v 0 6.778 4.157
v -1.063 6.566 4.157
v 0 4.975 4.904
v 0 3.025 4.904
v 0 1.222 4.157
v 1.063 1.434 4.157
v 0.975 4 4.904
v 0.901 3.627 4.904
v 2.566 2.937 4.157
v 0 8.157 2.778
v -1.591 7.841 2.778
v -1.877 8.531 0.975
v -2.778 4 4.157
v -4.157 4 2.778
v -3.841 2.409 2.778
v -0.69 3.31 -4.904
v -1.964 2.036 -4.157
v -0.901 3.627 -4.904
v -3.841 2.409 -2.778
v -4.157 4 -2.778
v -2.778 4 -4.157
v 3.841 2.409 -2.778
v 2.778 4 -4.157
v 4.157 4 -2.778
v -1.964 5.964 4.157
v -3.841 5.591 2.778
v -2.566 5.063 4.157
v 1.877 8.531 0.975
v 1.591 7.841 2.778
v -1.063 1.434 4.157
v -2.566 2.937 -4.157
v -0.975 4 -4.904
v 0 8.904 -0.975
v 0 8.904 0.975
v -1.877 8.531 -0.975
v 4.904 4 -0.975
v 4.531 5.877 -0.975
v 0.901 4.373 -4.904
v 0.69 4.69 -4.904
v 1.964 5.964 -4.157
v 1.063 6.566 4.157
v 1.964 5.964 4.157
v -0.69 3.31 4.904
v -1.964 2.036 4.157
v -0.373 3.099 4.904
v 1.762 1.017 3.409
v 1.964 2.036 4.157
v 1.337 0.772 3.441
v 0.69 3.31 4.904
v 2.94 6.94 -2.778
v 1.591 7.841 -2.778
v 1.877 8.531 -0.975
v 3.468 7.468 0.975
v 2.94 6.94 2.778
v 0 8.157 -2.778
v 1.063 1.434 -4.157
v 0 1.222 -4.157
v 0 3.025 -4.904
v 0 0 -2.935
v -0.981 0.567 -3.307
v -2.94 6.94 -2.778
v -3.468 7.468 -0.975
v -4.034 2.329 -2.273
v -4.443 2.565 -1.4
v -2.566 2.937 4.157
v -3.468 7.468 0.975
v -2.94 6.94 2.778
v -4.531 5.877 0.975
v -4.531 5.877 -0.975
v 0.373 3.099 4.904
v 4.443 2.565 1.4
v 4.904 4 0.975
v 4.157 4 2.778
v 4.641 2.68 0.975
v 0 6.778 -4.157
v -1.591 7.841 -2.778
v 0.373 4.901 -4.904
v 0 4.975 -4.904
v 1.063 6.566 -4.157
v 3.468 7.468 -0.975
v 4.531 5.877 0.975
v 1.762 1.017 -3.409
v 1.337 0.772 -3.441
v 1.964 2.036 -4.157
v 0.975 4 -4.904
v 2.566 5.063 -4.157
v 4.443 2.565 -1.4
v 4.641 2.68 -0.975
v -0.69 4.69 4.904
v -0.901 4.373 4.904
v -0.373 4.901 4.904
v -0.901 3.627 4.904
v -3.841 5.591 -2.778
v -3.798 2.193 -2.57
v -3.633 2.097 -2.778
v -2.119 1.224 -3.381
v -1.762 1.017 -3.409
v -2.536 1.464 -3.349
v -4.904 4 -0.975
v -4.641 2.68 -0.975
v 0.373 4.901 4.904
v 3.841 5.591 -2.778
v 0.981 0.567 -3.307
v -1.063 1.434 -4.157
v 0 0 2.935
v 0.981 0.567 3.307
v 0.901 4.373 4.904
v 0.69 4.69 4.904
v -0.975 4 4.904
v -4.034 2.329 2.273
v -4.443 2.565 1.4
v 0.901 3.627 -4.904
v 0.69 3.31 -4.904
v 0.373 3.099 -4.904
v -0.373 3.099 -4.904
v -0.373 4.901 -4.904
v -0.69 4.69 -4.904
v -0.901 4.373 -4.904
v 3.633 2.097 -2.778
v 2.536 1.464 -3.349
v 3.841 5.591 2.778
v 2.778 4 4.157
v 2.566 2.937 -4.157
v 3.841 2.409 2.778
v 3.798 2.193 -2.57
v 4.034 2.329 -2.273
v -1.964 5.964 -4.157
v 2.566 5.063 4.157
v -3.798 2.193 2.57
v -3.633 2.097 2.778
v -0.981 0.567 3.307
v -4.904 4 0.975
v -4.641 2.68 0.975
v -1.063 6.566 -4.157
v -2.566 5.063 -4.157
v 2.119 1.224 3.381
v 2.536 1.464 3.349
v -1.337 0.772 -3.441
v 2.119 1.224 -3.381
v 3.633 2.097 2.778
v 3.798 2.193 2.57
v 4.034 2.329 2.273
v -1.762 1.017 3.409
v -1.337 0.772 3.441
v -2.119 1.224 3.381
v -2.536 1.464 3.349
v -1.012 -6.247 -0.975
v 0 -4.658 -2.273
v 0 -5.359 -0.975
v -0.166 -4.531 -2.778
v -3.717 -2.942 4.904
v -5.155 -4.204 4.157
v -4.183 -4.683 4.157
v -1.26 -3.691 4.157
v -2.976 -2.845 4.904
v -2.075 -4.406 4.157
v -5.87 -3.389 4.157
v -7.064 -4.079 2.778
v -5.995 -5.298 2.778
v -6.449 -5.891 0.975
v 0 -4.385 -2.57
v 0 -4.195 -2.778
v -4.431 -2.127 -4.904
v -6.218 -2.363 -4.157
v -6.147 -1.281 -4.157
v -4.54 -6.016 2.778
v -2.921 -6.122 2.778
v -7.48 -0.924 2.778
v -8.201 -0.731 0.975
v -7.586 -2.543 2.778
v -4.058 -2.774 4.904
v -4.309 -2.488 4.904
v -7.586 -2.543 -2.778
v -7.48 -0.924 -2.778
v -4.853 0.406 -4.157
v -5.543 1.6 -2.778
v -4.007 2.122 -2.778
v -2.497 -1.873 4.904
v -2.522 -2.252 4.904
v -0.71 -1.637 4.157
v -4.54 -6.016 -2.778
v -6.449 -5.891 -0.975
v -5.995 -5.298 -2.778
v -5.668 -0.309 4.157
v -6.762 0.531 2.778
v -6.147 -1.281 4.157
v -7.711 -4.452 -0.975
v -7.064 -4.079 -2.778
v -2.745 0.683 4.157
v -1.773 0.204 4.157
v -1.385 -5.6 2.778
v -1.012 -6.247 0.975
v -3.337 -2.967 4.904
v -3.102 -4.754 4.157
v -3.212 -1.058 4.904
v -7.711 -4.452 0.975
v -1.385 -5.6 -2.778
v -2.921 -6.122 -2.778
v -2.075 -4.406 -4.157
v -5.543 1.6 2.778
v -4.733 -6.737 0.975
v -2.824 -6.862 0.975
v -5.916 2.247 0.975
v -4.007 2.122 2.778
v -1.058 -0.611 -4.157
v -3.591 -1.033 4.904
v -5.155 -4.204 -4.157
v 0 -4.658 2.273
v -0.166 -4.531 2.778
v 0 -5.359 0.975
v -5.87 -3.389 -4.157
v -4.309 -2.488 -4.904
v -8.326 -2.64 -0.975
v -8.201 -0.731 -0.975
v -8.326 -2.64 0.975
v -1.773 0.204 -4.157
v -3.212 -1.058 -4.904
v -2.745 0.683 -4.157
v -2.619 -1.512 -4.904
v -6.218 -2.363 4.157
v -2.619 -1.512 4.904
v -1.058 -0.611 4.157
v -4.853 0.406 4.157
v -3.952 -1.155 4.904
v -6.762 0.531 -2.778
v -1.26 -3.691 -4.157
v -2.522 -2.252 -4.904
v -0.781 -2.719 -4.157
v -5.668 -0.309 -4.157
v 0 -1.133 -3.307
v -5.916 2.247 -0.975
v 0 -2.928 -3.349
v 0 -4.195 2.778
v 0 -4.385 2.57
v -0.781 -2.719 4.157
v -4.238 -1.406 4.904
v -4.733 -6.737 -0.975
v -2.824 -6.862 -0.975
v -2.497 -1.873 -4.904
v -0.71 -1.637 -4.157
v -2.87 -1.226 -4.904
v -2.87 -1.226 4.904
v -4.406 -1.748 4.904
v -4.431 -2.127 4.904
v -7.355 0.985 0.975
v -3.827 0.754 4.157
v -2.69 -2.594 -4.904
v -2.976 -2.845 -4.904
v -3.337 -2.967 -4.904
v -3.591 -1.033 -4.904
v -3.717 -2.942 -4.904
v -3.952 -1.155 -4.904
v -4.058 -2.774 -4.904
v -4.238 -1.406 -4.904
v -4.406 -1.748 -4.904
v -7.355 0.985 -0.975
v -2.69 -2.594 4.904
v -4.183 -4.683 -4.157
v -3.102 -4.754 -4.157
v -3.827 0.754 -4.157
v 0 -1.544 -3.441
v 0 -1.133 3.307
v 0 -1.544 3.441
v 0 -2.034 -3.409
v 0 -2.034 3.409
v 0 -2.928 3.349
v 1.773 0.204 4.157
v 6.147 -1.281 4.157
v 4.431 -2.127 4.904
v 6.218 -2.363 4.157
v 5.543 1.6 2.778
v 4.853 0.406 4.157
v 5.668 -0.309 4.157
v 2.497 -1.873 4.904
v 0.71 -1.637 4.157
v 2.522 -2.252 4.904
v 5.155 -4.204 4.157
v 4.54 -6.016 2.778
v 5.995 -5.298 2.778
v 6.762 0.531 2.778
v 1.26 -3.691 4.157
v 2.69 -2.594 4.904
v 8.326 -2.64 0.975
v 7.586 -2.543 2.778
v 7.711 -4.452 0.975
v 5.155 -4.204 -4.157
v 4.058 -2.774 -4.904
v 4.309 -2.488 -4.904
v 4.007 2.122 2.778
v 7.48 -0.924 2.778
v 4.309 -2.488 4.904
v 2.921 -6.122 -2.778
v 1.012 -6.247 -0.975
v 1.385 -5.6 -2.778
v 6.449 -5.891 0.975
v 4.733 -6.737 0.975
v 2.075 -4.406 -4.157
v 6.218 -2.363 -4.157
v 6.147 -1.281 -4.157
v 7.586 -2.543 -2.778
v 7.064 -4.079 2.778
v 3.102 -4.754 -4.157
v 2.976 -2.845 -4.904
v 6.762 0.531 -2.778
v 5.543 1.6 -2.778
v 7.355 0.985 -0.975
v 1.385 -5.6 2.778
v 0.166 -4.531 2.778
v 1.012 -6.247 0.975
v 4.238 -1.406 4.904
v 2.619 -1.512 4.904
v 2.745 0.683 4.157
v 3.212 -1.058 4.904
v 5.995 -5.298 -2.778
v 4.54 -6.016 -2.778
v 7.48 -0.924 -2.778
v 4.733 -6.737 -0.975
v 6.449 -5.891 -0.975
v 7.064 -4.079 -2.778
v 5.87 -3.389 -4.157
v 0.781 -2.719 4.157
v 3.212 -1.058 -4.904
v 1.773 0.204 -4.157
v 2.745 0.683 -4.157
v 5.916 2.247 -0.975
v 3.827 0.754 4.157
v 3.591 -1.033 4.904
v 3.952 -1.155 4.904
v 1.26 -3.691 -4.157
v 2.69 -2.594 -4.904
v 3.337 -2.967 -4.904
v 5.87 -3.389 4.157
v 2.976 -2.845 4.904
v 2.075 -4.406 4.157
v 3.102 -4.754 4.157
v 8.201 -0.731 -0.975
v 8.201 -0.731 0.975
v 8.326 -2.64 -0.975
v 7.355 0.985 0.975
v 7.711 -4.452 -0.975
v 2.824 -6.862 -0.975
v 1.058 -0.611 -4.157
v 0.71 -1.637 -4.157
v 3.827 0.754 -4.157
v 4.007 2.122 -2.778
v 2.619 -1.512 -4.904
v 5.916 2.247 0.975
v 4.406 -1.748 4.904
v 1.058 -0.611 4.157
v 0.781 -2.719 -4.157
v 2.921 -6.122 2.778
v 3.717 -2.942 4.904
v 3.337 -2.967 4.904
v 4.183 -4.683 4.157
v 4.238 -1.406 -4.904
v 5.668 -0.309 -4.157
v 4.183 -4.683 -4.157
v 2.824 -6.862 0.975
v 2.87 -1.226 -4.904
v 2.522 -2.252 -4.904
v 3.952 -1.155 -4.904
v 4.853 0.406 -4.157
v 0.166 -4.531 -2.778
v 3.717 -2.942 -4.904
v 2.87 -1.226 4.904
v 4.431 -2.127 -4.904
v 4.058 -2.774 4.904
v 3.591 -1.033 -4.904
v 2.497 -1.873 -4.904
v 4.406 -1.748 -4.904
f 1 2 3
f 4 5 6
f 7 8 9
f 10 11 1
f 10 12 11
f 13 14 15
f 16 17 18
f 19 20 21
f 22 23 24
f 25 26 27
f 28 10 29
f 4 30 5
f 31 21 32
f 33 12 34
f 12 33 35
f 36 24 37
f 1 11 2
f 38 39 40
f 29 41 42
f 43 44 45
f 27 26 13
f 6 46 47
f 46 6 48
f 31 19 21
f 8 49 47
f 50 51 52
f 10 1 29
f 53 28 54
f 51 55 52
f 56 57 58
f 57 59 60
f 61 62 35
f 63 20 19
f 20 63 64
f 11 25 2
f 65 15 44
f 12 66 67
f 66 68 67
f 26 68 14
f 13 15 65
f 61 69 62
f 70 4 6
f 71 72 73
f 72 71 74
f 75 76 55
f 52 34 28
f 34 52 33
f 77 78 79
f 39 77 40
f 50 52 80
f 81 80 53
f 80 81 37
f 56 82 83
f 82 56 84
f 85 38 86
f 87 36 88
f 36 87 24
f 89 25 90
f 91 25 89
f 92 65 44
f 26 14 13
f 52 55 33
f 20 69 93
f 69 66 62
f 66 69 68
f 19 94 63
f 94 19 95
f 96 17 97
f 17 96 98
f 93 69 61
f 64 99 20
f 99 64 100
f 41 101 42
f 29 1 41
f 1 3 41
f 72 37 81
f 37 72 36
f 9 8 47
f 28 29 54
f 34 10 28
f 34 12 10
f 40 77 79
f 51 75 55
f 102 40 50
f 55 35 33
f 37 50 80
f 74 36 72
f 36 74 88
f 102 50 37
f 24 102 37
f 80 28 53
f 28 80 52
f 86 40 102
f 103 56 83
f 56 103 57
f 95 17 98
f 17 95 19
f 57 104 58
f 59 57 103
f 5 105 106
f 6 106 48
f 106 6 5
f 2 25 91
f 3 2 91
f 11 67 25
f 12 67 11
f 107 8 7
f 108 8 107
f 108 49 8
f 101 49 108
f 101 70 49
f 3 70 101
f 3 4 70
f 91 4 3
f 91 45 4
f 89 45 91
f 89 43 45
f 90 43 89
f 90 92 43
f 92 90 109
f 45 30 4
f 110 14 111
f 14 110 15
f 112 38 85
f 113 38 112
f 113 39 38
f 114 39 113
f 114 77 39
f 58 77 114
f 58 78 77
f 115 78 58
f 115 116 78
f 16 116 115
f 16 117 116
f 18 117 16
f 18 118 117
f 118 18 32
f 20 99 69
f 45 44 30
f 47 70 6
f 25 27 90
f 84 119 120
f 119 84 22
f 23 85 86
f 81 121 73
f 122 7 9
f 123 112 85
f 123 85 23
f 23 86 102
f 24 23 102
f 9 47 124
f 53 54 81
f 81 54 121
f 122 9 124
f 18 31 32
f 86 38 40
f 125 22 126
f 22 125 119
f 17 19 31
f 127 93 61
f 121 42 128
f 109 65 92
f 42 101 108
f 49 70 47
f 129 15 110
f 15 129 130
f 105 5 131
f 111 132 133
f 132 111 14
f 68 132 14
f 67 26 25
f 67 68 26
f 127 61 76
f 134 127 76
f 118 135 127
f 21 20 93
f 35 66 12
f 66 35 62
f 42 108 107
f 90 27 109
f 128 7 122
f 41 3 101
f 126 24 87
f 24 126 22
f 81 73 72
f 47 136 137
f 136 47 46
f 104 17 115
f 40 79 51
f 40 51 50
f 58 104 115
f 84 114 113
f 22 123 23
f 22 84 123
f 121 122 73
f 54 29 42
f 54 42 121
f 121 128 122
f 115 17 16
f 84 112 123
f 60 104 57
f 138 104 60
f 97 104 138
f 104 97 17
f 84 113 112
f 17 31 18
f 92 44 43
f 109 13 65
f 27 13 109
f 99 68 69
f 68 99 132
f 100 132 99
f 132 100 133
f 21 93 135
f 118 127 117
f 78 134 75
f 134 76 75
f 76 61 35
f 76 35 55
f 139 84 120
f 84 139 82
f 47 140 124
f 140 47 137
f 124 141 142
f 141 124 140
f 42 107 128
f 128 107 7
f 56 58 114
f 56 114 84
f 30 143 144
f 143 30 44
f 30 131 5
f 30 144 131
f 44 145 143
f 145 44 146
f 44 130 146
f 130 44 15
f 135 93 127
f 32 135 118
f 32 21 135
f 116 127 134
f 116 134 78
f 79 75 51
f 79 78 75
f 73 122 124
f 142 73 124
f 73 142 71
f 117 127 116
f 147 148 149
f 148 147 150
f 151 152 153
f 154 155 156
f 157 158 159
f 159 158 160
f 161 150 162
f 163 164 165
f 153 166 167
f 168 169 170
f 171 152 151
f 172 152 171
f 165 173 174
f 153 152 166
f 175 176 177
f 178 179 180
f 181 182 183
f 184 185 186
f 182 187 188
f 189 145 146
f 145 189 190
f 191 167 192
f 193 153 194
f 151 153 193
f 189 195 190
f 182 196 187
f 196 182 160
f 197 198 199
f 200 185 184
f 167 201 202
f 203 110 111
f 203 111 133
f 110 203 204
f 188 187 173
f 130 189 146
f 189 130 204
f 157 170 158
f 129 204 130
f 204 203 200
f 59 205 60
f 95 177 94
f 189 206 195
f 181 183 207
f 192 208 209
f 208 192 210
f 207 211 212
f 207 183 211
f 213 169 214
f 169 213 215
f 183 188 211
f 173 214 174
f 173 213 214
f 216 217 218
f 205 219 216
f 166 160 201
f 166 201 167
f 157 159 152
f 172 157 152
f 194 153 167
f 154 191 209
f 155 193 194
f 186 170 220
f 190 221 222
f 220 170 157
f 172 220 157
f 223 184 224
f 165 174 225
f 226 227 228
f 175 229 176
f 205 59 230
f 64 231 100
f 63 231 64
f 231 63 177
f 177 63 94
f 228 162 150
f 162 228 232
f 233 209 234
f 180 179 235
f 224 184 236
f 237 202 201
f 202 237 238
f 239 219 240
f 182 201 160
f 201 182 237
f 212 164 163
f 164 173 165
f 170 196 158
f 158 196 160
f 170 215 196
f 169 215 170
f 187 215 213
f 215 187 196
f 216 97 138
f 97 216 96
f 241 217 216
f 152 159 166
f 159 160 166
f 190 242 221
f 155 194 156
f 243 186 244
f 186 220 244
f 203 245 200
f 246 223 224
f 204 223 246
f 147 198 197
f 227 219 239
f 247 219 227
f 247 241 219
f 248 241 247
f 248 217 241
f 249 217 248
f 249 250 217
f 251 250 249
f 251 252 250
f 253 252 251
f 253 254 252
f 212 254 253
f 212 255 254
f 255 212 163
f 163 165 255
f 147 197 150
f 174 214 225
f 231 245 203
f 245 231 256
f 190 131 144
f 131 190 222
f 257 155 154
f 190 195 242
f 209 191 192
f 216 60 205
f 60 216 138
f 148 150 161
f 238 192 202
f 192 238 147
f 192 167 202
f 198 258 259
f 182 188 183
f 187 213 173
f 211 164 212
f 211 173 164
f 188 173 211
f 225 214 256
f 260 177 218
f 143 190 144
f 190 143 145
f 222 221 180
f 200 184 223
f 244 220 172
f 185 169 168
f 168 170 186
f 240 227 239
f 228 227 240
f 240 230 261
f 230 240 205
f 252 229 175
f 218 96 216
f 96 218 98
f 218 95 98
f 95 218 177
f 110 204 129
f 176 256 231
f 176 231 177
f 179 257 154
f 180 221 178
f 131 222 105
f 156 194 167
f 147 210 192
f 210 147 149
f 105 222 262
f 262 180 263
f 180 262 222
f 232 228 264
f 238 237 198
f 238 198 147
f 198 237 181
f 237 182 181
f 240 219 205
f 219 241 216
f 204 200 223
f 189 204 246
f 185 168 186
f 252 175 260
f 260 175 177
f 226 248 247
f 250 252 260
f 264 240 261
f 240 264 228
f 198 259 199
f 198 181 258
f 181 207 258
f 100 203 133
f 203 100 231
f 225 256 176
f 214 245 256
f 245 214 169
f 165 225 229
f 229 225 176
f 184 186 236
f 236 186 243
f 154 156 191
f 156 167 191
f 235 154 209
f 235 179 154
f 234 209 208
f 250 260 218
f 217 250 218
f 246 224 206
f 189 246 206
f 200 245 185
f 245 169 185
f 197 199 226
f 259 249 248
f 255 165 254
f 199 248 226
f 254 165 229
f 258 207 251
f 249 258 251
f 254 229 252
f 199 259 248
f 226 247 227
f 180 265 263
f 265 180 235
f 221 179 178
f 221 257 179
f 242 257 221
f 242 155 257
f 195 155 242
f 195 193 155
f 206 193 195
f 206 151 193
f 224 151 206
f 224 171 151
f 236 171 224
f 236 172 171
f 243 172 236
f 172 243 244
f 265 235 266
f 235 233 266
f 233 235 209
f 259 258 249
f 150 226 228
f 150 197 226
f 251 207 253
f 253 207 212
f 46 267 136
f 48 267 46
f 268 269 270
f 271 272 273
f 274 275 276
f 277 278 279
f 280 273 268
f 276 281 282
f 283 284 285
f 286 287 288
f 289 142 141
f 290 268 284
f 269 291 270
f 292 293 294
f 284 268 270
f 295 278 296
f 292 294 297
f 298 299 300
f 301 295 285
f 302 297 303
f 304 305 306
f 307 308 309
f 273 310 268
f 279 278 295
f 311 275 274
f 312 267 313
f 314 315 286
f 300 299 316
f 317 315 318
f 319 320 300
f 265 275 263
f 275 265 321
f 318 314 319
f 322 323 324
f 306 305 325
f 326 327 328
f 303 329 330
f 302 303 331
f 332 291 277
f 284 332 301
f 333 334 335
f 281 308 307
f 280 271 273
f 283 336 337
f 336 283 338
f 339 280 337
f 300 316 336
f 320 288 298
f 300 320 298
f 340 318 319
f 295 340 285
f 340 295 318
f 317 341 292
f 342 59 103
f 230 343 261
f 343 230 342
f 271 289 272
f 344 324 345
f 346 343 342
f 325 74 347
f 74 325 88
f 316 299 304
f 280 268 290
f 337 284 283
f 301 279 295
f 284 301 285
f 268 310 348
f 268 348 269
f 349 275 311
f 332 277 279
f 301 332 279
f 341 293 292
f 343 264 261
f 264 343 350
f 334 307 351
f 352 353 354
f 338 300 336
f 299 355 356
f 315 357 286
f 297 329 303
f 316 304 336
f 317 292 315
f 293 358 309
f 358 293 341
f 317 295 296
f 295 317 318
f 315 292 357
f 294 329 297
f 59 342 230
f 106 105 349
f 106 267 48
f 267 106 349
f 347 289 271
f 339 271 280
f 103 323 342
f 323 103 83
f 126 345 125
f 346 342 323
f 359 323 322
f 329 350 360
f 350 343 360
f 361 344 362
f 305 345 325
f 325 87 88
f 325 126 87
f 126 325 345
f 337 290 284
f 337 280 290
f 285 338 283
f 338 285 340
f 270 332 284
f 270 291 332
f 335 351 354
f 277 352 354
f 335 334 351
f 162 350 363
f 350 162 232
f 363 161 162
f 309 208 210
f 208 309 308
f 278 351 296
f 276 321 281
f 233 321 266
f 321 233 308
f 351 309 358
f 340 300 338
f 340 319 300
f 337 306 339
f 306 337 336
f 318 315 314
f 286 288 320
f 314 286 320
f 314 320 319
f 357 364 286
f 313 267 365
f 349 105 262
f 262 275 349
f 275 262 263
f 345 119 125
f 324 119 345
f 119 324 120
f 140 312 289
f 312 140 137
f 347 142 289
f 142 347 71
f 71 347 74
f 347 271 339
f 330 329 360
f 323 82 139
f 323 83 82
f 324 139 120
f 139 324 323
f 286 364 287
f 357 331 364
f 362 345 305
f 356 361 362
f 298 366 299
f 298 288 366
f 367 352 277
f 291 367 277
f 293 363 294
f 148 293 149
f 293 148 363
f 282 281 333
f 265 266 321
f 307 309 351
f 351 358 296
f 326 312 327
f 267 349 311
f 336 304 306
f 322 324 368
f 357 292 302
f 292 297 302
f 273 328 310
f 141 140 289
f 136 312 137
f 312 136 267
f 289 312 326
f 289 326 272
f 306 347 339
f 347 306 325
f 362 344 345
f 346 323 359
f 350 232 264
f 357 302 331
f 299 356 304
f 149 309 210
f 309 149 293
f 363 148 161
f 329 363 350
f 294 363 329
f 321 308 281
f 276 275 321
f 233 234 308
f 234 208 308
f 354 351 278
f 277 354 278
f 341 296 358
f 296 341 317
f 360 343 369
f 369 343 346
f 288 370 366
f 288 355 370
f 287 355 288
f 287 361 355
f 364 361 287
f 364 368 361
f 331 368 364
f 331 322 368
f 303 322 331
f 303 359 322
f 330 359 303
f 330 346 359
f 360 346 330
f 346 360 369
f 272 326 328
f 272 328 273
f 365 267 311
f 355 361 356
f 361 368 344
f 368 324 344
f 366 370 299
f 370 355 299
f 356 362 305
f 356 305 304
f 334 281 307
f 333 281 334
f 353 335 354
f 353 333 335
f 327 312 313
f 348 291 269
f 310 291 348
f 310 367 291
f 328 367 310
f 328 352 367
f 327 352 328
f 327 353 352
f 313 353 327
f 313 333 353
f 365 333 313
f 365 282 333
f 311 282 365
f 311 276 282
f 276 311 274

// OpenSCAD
difference() for (i=[0:2]) rotate(90+i*360/3) translate([4,0,0]) sphere(5);
